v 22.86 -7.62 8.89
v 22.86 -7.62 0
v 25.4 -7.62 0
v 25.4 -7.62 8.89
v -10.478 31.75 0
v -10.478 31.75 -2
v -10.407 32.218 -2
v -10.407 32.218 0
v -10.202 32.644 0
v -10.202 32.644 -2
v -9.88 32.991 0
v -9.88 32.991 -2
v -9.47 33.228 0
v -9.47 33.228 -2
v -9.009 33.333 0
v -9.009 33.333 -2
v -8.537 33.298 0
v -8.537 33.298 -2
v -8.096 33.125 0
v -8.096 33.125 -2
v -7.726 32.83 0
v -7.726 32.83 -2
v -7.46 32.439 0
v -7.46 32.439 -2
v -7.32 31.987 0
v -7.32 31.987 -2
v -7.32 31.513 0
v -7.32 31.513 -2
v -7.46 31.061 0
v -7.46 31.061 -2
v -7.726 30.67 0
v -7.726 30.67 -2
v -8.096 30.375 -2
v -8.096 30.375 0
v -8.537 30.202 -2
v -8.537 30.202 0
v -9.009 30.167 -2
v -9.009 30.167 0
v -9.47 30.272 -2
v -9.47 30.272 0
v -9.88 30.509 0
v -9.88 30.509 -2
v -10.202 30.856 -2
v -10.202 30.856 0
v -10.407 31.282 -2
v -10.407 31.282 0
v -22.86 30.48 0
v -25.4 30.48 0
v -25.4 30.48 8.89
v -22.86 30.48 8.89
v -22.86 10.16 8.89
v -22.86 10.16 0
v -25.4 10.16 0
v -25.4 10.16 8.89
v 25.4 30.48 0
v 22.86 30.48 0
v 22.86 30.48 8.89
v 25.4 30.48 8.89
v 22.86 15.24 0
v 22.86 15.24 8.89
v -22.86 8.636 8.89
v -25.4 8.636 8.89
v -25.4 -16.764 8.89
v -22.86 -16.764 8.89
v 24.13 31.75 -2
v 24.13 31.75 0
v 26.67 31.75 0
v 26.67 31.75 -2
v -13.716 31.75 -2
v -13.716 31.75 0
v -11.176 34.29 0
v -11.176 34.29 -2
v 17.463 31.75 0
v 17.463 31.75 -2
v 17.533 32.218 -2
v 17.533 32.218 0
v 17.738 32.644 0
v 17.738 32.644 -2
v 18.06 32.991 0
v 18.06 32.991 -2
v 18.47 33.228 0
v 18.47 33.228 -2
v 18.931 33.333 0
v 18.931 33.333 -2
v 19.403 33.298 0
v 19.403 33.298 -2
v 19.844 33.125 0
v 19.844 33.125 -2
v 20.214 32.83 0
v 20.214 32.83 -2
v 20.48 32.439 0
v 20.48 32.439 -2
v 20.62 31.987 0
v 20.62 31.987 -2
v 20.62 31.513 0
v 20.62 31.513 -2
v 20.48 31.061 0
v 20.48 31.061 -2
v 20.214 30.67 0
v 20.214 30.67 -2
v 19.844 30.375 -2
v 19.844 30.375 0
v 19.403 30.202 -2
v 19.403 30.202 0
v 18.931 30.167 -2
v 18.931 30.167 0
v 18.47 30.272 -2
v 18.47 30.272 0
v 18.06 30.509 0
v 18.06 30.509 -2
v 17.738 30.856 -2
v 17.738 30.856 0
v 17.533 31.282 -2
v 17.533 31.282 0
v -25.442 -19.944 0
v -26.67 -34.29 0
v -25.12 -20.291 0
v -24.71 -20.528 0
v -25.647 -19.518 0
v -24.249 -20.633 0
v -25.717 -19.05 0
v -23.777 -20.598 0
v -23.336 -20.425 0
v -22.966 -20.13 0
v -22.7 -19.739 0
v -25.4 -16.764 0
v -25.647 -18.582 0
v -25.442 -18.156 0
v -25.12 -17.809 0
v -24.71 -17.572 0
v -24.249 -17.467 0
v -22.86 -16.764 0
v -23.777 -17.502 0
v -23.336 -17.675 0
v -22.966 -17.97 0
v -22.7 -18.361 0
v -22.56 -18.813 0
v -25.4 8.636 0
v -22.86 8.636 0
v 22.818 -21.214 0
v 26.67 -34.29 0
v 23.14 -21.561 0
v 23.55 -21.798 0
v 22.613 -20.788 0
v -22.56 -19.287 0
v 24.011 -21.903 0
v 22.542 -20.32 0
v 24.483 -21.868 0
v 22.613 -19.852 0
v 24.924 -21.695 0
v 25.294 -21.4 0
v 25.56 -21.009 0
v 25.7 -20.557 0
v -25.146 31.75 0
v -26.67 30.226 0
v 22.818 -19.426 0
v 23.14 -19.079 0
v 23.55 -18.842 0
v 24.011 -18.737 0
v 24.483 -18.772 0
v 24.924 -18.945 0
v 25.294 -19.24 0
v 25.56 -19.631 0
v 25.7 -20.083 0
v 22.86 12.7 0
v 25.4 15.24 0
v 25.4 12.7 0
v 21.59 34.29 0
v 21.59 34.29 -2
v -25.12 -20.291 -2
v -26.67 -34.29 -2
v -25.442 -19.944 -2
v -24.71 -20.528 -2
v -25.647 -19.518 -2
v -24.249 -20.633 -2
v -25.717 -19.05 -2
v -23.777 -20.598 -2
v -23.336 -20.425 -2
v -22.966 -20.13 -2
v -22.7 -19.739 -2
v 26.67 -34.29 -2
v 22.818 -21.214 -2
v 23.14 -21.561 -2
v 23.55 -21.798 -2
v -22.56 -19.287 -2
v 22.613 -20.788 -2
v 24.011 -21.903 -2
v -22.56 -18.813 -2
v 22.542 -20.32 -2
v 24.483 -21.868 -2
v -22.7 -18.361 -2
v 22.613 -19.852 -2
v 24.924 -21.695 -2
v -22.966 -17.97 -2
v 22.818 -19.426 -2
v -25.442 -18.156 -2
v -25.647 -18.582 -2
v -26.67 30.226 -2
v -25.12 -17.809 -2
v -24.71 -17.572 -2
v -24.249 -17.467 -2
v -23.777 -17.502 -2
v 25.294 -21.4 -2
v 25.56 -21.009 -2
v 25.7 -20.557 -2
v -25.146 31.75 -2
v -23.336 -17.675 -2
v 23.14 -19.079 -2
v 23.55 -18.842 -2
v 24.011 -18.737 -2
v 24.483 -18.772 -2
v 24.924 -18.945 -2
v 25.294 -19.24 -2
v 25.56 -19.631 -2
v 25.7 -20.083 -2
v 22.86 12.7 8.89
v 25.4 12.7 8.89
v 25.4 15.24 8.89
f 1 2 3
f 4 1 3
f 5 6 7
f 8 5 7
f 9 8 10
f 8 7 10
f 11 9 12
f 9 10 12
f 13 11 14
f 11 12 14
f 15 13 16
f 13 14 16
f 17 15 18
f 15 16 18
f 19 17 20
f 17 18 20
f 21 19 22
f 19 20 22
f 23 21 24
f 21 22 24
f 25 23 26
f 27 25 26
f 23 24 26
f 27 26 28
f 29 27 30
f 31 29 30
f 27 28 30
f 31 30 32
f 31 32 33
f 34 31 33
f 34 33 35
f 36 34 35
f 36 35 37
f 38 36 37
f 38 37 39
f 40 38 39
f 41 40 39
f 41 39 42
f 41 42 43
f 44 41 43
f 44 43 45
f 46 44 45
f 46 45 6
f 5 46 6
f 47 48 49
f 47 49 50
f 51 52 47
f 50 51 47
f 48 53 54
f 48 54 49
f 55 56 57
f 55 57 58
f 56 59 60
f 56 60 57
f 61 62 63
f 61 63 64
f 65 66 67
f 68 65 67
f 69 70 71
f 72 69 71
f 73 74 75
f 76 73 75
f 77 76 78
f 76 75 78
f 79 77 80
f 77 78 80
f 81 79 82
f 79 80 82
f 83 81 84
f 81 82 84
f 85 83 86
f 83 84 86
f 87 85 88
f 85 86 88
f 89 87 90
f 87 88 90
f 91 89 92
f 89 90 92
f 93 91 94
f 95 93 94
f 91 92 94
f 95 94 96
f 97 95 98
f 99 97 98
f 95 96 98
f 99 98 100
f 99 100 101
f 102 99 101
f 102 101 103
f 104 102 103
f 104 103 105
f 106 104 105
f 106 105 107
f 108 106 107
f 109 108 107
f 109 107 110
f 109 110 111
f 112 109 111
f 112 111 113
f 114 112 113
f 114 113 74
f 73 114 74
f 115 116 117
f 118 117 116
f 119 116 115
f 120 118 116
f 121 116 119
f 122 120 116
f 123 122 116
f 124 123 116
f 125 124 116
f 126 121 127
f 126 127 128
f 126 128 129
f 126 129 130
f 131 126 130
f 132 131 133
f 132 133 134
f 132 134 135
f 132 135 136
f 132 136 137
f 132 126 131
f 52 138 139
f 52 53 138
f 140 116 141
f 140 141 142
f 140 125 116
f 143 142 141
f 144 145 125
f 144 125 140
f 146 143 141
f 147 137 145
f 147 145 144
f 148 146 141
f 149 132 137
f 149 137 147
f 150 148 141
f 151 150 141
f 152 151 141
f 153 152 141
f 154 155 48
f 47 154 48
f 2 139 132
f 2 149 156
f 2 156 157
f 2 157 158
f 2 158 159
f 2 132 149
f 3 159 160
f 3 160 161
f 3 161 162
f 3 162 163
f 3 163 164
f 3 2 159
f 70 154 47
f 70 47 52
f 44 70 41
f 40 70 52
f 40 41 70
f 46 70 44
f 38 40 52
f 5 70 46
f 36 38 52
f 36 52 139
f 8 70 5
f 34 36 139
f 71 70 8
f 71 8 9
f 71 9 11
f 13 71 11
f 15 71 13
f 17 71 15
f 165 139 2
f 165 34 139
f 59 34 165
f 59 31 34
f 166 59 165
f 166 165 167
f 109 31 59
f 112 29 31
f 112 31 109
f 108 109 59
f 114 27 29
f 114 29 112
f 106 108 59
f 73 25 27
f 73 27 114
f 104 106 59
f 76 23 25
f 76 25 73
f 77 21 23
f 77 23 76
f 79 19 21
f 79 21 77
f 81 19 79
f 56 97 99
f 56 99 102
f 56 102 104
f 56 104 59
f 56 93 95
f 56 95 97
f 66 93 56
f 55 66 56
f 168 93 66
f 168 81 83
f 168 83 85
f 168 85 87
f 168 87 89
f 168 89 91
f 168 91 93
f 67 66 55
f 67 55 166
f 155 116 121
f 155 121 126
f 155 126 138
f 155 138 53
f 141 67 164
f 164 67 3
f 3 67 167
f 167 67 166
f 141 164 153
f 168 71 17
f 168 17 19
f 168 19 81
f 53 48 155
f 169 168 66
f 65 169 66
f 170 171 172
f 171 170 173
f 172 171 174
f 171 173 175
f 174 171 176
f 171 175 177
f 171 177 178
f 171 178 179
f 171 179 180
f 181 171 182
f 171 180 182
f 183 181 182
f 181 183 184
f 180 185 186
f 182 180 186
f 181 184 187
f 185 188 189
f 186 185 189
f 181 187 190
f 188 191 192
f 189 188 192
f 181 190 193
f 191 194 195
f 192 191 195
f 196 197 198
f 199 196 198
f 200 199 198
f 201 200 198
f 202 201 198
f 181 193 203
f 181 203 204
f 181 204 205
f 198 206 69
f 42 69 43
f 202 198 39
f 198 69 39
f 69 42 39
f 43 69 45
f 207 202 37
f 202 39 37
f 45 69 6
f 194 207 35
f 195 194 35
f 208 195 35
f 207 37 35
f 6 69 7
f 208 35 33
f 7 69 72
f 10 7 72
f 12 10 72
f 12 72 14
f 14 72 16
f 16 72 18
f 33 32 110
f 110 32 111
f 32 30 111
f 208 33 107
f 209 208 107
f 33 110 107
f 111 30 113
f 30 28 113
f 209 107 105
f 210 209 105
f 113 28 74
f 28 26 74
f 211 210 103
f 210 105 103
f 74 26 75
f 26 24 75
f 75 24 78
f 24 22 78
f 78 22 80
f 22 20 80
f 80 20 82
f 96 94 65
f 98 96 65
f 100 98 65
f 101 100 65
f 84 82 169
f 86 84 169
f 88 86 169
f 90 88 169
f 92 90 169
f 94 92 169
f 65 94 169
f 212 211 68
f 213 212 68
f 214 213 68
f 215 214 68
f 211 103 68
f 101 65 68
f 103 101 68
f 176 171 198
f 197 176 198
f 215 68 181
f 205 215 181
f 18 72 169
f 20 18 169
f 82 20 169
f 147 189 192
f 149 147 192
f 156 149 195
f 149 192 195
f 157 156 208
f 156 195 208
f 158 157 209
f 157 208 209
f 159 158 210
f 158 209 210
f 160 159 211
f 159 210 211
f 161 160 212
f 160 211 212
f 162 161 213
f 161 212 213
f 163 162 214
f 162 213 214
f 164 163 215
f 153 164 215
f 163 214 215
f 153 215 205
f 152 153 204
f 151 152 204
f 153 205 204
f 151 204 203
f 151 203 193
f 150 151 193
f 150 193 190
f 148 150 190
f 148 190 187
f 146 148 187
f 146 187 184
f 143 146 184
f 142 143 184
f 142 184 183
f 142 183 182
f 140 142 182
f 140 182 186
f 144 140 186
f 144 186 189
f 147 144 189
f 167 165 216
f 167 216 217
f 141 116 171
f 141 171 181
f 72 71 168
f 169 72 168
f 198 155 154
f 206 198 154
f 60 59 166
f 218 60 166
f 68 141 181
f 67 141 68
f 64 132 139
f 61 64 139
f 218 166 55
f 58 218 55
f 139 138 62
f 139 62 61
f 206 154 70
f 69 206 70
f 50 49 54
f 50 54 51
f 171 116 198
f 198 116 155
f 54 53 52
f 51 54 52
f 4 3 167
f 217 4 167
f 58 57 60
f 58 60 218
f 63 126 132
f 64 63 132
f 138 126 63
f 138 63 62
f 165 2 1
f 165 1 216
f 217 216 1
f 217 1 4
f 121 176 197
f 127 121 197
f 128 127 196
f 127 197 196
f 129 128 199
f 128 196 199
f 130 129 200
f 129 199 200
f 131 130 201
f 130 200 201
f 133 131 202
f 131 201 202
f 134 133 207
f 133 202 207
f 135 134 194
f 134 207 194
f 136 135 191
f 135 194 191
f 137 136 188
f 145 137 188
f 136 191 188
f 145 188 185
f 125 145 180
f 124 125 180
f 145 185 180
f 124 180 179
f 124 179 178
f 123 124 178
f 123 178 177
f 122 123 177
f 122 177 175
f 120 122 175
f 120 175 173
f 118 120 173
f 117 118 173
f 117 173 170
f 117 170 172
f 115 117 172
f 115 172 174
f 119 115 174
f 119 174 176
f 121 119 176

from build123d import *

# Parameters (mm, degrees)
F0_W     = 53.34
F0_H     = 68.58
F1_DEPTH = 2
F3_DEPTH = 2
F6_D     = 3.175
F7_W     = 2.54
F7_H     = 20.32
F7_H_2   = 25.4
F7_H_3   = 15.24
F8_DEPTH = 8.89


# Not quite as in the source:
# - a feature names something its author has since deleted; it is built from what else it names


with BuildPart() as f1:
    # F0 (on Top) → F1 (new body)
    with BuildSketch(Plane.XY):
        Rectangle(F0_W, F0_H)
    extrude(amount=-F1_DEPTH)

    # F2 (on face) → F3 (cut, through all)
    with BuildSketch(Plane.XY):
        Polygon((-25.146, 31.75), (-13.716, 31.75), (-11.176, 34.29), (-26.67, 34.29), (-26.67, 30.226), align=None)
        Polygon((26.67, 34.29), (21.59, 34.29), (24.13, 31.75), (26.67, 31.75), align=None)
    extrude(amount=-F3_DEPTH, mode=Mode.SUBTRACT)

    # F6 (through all)
    with Locations(Plane.XY):
        with Locations((-24.13, -19.05), (24.13, -20.32), (19.05, 31.75), (-8.89, 31.75)):
            Hole(F6_D / 2)

    # F7 (on face) → F8 (join)
    with BuildSketch(Plane.XY):
        with Locations((-24.13, 20.32)):
            Rectangle(F7_W, F7_H)
        with Locations((-24.13, -4.064)):
            Rectangle(F7_W, F7_H_2)
        with Locations((24.13, 22.86)):
            Rectangle(F7_W, F7_H_3)
        with Locations((24.13, 2.54)):
            Rectangle(F7_W, F7_H)
    extrude(amount=F8_DEPTH)


solid = f1.part
